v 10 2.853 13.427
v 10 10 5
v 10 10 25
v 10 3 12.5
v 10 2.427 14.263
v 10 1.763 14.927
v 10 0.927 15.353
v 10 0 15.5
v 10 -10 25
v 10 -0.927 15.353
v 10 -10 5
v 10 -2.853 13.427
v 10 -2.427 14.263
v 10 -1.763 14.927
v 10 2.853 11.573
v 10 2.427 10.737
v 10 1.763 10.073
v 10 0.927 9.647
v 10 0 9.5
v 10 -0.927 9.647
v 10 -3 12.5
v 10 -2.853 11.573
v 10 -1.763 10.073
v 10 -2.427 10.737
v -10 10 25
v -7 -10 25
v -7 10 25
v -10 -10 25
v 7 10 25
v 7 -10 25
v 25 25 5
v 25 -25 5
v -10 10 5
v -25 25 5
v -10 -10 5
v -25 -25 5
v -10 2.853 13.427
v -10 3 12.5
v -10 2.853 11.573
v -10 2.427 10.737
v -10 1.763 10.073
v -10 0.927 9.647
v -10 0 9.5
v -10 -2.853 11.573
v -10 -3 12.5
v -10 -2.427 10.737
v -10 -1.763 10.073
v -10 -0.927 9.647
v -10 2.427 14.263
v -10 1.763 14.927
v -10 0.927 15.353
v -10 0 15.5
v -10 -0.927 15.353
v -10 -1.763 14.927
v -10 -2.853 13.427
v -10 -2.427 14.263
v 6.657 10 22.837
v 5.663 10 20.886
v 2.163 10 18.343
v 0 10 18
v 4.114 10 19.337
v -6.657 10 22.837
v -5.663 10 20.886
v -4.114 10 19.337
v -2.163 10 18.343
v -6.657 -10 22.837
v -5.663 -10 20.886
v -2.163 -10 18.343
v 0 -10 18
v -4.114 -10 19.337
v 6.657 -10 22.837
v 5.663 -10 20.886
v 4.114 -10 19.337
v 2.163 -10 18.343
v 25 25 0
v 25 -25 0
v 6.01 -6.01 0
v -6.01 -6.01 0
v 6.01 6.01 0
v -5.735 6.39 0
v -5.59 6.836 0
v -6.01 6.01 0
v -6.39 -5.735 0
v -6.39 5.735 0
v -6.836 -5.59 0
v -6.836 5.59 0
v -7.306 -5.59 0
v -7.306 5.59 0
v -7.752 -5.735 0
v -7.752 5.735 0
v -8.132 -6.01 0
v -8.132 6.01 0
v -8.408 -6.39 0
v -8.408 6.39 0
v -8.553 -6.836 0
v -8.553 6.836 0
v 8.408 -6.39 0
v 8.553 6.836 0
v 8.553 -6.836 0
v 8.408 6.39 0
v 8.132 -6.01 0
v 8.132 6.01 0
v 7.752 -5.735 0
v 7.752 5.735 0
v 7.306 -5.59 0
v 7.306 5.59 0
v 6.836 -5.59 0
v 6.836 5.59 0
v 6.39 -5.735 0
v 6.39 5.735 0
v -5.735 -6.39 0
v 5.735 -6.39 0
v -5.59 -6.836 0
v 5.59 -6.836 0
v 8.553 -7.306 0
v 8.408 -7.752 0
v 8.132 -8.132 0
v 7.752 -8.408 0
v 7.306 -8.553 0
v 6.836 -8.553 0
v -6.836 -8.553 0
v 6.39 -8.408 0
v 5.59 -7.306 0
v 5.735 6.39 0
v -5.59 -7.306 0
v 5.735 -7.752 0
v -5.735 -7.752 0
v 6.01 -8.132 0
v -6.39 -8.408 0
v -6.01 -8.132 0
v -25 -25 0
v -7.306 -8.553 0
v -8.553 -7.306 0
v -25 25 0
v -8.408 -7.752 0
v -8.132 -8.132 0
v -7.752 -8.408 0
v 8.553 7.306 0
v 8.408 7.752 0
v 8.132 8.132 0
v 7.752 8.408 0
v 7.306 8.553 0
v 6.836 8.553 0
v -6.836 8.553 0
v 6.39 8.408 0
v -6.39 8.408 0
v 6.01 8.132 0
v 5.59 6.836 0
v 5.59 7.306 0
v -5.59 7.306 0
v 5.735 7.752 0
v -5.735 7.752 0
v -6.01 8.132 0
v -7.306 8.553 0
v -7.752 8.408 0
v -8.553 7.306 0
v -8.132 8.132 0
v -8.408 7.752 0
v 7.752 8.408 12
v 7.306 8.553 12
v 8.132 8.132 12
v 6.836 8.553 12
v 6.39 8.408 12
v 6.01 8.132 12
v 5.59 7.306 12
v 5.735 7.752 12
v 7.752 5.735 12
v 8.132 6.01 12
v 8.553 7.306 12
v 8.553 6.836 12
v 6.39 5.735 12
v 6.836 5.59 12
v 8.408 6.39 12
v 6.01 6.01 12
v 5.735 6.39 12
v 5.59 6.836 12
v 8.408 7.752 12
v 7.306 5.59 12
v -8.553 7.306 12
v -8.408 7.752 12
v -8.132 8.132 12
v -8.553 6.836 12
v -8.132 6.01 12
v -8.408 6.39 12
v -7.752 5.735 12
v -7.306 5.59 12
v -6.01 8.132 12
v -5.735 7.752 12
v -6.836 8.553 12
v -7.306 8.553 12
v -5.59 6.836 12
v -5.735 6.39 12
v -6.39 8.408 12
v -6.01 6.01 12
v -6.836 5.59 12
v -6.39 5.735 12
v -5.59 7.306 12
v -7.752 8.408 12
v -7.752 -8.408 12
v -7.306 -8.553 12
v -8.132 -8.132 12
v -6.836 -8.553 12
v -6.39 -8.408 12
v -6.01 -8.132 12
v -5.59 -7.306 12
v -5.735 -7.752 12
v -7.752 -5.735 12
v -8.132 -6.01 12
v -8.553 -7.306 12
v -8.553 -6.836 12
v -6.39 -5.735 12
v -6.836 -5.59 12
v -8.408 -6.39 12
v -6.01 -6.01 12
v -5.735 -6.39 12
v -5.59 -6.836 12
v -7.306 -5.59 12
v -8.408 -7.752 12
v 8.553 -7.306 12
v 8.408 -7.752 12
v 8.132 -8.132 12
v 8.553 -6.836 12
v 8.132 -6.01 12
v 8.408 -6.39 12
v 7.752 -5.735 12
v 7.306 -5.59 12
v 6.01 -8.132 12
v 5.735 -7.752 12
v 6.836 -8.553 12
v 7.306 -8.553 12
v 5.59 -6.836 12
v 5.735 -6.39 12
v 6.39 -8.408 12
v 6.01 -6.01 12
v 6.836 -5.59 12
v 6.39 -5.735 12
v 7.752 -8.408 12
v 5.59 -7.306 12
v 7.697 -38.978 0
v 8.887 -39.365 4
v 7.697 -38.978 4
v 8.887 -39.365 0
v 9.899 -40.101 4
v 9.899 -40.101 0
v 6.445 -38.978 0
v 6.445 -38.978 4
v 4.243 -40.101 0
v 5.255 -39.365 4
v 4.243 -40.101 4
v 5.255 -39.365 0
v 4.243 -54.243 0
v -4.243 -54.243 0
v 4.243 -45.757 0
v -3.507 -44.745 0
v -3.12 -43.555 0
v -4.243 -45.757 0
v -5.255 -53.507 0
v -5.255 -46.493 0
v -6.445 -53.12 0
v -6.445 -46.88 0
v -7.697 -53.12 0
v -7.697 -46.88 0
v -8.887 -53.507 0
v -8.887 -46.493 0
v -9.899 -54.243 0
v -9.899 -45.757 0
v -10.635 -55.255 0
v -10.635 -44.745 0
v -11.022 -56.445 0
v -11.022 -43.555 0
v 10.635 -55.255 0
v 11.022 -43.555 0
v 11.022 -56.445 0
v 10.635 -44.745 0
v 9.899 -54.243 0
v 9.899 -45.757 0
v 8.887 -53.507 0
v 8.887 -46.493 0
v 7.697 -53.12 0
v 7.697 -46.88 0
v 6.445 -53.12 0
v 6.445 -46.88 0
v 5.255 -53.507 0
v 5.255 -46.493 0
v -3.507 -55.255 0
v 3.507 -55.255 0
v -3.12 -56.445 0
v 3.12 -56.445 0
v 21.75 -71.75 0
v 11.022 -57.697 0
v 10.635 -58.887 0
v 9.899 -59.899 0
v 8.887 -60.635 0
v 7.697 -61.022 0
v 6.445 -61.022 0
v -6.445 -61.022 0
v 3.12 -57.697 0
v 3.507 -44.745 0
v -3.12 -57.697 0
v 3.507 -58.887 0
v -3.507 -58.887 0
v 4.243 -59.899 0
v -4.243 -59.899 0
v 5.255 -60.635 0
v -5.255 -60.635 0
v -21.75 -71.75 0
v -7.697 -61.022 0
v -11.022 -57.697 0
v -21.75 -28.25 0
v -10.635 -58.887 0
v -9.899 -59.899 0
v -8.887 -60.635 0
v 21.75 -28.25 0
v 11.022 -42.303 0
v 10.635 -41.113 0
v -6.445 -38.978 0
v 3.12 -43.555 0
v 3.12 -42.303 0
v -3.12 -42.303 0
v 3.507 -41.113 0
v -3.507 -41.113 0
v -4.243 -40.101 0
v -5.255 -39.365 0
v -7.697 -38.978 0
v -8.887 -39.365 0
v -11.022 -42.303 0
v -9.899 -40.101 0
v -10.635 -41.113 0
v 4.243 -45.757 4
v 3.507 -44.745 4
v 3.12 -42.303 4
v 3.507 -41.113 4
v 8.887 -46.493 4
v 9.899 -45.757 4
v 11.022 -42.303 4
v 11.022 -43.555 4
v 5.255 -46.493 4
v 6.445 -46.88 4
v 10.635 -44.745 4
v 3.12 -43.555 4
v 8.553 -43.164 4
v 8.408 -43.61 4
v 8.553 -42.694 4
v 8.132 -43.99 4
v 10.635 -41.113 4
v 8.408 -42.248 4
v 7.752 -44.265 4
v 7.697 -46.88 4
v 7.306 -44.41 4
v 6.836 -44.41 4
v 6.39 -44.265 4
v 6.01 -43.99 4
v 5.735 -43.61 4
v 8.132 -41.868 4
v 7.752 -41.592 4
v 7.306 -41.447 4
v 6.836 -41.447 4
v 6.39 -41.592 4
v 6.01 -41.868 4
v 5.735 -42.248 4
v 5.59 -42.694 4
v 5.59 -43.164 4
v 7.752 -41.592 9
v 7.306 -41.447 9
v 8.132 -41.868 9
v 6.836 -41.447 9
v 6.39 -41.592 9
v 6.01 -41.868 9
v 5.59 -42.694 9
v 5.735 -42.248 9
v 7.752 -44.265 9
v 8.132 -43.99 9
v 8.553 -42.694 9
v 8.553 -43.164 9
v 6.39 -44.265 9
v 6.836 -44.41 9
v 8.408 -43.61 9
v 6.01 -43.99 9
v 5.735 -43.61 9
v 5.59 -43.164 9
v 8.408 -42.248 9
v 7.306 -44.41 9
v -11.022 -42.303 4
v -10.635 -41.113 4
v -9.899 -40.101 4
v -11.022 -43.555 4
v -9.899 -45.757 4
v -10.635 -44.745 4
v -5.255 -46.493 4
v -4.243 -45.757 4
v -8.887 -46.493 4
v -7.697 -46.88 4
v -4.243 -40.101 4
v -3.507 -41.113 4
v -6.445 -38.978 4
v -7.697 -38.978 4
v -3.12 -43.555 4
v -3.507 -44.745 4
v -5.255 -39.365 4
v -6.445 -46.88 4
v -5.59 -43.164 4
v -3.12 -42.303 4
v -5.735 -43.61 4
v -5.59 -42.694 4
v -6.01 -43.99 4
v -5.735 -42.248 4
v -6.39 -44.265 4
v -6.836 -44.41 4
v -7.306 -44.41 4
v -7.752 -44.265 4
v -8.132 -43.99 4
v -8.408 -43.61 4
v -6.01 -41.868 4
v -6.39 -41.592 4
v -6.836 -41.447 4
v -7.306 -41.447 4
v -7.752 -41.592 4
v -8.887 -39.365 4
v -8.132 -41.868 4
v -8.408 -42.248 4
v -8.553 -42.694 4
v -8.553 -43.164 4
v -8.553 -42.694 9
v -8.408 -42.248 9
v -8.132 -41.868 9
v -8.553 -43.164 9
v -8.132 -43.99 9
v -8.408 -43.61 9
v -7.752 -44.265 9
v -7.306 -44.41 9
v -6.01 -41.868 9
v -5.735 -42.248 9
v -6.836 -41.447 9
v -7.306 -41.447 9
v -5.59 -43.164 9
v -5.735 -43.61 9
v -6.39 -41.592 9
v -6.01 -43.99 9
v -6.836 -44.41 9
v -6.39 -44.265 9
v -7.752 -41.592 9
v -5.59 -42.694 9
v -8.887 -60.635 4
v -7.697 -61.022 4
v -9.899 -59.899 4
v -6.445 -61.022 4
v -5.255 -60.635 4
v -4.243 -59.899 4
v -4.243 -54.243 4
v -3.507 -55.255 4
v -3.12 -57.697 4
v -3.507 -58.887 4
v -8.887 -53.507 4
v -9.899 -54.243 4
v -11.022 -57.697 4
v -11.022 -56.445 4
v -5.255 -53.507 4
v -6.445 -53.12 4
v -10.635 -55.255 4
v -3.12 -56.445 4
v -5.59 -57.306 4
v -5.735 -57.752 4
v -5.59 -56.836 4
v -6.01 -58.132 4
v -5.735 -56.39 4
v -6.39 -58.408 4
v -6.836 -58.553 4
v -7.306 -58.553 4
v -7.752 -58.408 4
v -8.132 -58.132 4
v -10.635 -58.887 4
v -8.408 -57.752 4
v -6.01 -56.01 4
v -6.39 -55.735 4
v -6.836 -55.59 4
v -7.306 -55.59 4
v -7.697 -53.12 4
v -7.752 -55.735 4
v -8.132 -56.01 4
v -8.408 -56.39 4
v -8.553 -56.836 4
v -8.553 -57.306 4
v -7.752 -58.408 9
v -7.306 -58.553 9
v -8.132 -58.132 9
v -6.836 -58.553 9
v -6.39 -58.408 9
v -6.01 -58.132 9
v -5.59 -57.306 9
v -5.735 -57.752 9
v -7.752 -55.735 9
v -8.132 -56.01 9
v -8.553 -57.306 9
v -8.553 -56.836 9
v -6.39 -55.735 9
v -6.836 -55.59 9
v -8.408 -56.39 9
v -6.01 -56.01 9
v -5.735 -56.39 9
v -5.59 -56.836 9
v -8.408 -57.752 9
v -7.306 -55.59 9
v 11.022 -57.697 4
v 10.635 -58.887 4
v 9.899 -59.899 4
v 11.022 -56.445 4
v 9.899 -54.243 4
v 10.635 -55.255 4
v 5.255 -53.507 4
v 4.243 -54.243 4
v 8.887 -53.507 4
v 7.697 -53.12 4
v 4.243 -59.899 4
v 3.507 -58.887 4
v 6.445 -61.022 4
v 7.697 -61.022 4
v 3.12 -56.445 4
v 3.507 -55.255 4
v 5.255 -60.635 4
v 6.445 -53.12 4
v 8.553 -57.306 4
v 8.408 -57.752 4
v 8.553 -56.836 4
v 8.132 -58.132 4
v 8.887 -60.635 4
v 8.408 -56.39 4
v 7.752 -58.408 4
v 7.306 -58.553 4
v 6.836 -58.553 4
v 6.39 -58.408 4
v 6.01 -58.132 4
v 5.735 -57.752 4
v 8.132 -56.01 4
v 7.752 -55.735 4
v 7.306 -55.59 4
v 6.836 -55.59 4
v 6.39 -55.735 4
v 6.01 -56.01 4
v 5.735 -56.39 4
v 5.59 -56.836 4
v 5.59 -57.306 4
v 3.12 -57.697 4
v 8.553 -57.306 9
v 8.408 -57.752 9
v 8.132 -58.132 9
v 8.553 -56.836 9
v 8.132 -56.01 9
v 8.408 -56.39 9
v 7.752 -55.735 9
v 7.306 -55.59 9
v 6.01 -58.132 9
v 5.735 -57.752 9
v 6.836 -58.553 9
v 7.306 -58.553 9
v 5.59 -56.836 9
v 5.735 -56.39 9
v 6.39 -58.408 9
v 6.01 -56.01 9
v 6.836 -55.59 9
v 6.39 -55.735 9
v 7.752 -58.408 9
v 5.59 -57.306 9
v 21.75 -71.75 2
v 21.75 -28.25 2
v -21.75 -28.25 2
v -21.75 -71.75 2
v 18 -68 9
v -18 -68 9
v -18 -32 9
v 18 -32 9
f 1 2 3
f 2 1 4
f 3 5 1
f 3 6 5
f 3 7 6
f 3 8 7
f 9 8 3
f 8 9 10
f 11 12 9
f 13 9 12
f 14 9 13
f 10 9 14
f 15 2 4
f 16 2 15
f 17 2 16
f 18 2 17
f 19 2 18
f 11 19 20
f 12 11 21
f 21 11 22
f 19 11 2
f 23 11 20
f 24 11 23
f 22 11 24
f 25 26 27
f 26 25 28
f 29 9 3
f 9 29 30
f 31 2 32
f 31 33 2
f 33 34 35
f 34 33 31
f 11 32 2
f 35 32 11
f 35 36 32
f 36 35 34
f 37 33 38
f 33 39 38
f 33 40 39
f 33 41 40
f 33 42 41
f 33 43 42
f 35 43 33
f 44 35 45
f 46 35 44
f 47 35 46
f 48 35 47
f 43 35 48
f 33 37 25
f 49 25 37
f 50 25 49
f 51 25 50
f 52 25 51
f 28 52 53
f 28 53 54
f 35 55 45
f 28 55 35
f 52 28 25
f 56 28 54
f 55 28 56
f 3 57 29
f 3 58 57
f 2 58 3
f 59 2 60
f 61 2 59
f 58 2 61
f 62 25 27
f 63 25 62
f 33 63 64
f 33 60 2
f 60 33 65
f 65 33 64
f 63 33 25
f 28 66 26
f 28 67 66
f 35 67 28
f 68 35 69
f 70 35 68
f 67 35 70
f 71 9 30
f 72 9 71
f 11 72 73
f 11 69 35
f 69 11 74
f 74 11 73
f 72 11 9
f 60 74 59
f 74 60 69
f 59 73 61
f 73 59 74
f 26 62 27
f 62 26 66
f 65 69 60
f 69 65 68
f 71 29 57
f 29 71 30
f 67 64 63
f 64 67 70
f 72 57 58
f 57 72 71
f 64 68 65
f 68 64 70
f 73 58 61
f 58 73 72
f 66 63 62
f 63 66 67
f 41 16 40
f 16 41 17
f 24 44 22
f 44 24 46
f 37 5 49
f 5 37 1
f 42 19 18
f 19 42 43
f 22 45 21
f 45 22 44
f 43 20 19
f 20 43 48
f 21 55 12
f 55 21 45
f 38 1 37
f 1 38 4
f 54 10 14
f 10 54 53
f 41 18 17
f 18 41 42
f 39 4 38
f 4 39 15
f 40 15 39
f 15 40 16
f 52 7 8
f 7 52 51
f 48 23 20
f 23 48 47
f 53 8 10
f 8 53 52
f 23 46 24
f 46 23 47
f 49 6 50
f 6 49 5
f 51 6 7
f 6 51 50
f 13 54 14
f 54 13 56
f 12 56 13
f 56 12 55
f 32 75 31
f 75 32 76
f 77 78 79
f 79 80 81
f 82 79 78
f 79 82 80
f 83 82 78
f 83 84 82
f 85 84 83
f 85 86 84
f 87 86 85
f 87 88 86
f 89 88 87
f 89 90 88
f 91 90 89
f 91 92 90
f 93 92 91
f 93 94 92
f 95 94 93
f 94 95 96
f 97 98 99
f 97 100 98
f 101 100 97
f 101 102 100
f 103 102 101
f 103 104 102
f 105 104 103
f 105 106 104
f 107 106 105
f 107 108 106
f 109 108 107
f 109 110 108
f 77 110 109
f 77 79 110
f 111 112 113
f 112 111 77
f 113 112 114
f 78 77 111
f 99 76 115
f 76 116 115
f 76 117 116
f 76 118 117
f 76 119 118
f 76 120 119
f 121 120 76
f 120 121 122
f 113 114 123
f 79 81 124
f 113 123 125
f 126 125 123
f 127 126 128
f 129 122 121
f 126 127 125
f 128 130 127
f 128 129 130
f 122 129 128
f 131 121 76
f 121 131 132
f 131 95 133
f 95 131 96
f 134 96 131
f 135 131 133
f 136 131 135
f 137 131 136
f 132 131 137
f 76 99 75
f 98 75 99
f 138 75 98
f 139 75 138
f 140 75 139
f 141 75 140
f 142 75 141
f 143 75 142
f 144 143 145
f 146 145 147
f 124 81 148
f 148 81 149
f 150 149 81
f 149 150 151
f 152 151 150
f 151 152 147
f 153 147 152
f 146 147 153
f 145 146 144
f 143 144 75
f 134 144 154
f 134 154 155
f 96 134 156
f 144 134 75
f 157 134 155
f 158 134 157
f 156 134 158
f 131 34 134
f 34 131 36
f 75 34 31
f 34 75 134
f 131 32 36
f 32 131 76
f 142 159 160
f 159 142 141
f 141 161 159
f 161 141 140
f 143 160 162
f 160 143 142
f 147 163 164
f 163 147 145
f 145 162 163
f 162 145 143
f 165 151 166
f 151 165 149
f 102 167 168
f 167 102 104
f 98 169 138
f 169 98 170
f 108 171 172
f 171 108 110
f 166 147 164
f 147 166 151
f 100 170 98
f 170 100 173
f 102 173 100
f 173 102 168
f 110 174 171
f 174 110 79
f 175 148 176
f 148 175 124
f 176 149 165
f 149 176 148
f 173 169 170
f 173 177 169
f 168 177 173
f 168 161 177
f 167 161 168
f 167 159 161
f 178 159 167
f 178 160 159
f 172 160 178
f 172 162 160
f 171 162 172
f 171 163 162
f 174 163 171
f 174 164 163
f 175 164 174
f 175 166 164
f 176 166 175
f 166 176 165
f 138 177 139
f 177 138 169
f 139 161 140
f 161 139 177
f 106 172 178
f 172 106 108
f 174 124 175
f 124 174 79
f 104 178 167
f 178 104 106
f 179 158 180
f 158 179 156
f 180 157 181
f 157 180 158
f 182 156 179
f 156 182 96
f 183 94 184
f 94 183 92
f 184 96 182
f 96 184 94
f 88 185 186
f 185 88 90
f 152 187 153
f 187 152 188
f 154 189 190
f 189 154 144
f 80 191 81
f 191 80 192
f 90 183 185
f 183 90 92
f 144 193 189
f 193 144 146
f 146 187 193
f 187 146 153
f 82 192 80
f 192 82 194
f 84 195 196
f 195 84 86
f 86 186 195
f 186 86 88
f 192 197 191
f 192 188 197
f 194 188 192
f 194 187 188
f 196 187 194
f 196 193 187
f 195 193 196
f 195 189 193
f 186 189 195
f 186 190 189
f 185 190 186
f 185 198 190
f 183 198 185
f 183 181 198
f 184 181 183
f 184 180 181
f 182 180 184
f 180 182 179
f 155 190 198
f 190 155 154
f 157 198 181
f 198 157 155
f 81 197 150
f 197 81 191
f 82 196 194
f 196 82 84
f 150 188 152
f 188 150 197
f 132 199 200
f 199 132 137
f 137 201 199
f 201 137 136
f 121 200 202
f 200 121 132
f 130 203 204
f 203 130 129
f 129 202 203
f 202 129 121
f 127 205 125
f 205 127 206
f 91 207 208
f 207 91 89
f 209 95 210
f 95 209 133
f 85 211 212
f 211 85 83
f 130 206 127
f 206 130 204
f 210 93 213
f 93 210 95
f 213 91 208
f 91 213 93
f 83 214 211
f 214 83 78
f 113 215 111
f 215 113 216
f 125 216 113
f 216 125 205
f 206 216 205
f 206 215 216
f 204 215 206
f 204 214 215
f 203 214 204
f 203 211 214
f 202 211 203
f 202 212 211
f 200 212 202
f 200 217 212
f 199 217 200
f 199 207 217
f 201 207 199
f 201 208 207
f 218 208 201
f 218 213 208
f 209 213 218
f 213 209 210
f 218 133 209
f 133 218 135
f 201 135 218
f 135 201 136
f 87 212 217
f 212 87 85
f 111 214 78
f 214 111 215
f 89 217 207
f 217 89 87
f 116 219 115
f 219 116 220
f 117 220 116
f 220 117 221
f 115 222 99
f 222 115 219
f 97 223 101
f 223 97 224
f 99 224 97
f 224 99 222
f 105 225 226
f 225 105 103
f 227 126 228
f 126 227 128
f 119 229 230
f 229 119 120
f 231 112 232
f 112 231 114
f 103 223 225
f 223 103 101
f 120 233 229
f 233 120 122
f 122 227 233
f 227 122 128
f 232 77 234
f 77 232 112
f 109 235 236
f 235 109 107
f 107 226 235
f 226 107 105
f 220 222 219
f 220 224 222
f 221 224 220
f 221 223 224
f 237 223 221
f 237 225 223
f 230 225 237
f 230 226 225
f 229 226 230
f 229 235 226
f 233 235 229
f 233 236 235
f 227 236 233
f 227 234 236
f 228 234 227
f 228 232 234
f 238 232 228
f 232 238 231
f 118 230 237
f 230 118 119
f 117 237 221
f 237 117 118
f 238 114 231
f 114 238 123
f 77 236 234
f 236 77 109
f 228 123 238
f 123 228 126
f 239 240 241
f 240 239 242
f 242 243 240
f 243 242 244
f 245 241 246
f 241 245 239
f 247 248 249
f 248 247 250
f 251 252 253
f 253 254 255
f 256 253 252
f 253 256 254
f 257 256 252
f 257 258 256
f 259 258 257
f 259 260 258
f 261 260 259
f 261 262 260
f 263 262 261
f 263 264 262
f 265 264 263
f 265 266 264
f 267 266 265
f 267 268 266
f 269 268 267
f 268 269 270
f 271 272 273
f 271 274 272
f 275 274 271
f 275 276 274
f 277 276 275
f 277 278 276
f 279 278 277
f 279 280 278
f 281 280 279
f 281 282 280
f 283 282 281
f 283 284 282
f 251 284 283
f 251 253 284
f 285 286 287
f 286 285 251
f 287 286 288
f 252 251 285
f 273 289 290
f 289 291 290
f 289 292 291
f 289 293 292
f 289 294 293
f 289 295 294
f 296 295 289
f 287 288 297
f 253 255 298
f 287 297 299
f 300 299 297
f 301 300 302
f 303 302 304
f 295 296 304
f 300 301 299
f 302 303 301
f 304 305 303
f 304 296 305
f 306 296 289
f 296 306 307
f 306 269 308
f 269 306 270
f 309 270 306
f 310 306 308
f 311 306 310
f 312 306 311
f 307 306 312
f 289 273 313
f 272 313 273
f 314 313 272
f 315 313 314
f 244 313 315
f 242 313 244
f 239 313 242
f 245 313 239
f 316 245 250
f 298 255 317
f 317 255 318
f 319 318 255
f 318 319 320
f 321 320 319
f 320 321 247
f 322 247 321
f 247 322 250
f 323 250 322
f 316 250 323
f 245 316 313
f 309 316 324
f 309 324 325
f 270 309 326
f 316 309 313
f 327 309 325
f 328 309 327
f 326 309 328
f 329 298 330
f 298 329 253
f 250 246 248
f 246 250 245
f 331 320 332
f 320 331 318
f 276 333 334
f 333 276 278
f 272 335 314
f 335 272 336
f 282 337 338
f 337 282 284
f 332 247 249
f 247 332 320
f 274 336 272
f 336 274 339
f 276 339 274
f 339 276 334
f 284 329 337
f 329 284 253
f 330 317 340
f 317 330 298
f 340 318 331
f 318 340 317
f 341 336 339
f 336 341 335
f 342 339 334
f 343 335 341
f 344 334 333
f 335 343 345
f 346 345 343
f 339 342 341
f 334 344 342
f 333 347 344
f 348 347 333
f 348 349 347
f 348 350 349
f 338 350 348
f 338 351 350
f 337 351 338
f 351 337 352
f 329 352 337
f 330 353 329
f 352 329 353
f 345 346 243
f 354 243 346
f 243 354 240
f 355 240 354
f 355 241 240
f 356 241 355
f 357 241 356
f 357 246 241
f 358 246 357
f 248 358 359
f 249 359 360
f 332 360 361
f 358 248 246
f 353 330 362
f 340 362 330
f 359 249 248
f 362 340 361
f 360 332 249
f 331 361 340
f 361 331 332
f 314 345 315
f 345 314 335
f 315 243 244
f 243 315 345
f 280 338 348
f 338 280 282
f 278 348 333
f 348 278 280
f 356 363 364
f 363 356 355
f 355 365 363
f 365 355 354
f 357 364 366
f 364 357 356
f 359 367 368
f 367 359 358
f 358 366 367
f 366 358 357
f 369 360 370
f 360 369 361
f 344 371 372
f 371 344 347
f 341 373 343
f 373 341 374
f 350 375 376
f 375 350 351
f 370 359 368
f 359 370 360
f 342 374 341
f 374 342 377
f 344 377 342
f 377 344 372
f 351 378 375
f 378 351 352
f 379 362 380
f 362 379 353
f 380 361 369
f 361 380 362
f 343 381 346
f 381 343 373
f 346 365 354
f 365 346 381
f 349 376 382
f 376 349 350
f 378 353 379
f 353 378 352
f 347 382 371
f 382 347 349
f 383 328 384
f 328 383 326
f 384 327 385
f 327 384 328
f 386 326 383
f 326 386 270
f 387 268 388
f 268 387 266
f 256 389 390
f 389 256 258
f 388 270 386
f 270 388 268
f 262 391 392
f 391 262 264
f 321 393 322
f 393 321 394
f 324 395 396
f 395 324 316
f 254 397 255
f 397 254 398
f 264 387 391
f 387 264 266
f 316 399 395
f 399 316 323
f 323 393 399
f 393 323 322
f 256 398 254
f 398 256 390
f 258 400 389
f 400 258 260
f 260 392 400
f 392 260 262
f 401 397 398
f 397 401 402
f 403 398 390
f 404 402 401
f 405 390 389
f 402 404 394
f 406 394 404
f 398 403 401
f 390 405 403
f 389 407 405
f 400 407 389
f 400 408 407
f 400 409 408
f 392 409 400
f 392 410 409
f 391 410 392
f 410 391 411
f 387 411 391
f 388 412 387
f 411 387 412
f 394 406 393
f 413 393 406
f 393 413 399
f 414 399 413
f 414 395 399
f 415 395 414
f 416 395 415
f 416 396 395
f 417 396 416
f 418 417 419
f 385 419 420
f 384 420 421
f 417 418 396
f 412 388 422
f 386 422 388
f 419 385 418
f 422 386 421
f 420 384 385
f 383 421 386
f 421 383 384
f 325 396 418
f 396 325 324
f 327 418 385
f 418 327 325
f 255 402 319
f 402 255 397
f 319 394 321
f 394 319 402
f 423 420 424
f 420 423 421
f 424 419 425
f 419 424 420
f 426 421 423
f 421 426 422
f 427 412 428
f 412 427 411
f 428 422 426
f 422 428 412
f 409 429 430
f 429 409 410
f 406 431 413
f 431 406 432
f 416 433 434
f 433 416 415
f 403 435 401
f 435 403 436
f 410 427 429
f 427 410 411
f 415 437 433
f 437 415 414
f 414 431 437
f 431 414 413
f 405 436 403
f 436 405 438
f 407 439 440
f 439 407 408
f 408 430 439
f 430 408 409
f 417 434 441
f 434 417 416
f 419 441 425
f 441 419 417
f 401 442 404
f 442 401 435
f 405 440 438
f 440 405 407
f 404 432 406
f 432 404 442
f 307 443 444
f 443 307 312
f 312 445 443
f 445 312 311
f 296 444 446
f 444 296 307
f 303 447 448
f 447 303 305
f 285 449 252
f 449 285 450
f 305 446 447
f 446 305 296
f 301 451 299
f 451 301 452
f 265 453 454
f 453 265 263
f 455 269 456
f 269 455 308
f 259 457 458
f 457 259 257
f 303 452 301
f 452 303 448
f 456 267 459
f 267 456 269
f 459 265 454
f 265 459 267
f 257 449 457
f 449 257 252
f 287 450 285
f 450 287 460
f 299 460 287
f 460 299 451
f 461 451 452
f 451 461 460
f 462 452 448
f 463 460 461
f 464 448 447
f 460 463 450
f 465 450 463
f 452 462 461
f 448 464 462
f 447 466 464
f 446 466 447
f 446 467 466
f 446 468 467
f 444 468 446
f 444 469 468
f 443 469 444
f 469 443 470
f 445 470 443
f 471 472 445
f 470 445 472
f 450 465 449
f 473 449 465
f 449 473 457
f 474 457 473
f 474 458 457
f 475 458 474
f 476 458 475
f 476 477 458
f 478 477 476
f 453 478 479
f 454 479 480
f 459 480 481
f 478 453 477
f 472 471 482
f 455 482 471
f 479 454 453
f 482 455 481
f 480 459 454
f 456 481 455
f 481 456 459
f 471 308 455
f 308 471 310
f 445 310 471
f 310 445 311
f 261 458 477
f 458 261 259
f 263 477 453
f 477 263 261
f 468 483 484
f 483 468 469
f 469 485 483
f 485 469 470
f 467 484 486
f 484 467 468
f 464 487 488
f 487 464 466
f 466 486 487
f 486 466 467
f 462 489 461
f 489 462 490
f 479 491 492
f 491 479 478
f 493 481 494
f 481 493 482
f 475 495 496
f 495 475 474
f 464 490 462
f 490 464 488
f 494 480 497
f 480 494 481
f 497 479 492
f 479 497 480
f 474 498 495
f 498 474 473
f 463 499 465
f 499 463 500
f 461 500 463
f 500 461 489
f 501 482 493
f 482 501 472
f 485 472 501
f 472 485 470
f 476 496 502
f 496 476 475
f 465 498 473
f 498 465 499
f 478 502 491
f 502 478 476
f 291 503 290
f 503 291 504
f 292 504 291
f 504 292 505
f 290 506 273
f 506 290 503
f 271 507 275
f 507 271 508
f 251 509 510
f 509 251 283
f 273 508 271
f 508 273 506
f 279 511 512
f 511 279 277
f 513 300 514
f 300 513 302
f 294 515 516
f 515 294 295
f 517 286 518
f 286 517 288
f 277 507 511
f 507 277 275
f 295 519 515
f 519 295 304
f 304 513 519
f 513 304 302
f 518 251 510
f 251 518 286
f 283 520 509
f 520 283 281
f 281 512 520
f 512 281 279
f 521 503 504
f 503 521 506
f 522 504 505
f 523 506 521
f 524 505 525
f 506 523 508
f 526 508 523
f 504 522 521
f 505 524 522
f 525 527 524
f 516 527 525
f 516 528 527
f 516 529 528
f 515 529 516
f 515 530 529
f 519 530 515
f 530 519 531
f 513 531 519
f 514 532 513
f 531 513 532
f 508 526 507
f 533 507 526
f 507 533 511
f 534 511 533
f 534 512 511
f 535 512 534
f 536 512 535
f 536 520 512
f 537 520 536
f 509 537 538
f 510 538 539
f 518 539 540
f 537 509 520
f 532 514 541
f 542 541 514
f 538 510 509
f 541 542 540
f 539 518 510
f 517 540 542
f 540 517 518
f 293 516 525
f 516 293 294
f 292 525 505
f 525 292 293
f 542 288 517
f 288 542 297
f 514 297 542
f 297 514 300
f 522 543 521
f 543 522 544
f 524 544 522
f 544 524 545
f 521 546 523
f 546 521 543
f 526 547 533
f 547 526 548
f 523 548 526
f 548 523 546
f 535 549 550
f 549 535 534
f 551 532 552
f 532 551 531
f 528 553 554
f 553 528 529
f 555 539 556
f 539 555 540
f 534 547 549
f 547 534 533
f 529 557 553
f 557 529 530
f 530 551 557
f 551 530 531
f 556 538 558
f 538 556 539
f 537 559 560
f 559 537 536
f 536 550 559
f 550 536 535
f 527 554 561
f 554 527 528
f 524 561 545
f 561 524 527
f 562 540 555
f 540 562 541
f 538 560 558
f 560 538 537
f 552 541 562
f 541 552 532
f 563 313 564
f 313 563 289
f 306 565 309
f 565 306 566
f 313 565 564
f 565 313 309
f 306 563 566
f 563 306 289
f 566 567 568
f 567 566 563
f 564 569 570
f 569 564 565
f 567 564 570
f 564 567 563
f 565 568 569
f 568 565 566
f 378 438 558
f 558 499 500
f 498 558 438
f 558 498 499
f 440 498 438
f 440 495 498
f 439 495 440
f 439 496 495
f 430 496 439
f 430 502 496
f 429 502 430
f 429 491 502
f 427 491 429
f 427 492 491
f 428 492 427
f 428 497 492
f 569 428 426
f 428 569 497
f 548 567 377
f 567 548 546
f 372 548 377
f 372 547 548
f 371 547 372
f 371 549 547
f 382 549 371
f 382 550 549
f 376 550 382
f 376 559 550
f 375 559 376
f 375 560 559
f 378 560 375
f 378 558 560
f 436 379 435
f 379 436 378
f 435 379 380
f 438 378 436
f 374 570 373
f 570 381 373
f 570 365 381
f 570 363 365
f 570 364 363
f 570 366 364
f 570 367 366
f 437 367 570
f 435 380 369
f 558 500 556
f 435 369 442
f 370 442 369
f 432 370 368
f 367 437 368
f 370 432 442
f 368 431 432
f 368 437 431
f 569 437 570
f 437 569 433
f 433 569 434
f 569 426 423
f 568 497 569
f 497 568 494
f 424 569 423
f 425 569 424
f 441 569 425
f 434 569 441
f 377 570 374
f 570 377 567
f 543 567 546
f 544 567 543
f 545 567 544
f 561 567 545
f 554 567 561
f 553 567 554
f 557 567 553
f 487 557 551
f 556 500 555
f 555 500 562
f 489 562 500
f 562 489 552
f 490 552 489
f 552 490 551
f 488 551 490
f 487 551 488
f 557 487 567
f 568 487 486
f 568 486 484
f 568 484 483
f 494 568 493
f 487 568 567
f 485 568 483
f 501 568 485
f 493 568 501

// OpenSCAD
// Designed for use with Hama "Star 61" Tripod

// Tripod mount is designed for mounting custom objects on a standard photographic tripod with removable base plate. It is designed to be 3D printed and assembled from two pieces. The top can be modified to fit any object.

// To assemble, use M3x20mm screws, they tap into the plastic of the palte directly.


//Dimensions of the attachment base defined here
base_lower_wl=43.5; // lower width
base_upper_wl=36; // upper width
base_h=9; // height of the base
base_h_flat=2; // height of the flat side

base_screw_head_dia=8; // diameter of the mounting screw
base_screw_head_h=4; // depth of screw head countersunk
base_screw_dia=3; // diameter of the screw
screw_l=25; // length of the screw
screw_dist=20; // distance between screws

// Dimensions of the upper part - plate
plate_wl=50; // size of the plate
plate_h=5; // thickness of the plate
// Attached to the plate is the mounting 

// Payload mount definition, custom for every use-case, note that holes for screws may be cut into the mount, depending on the screw length defined.
payload_cube_wl=20;

module payload_mount(){
			translate([-payload_cube_wl/2,-payload_cube_wl/2,0])
			difference(){
				cube(size = [payload_cube_wl,payload_cube_wl,payload_cube_wl], center=false);
				//groove for the laser
				translate([payload_cube_wl/2,payload_cube_wl/2,payload_cube_wl])
				rotate([90,0,0])
				cylinder(h=payload_cube_wl+0.1,r=14/2,center=true,$fn=20);
				//zip tie hole
				translate([payload_cube_wl/2,payload_cube_wl/2,7.5])
				rotate([0,90,0])
				cylinder(h=payload_cube_wl+0.1,r=6/2,center=true,$fn=20);
	
			}
}

// Function for creating a pyramid
module pyramid(w, l, h) {
	mw = w/2;
	ml = l/2;
	polyhedron(points = [
			[0, 0, 0],
			[w, 0, 0],
			[0, l, 0],
			[w, l, 0],
			[mw, ml, h]
		], triangles = [
			[4, 1, 0],
			[4, 3, 1],
			[4, 2, 3],
			[4, 0, 2],
			//base
			[0, 1, 2],
			[2, 1, 3]
		]);
}

// Creating a base for the tripod mount
module base(){
	translate([-base_lower_wl/2,-base_lower_wl/2,0])
	intersection(){
		union(){
			cube(size = [base_lower_wl,base_lower_wl,base_h_flat], center = false);
			translate([0,0,base_h_flat])
			pyramid(base_lower_wl,base_lower_wl,(base_lower_wl*(base_h-base_h_flat))/(base_lower_wl-base_upper_wl));
		}
		cube(size = [base_lower_wl,base_lower_wl,base_h], center = false);
	}
}

// A model of the screw
module sunk_screw(){
	translate([0,0,base_screw_head_h/2])
	cylinder(h=base_screw_head_h,r=base_screw_head_dia/2,center=true,$fn=20);
	translate([0,0,screw_l/2])
	cylinder(h=screw_l,r=base_screw_dia/2,center=true,$fn=20);
}

// Cutting the holes for the screws in the base
module base_with_screws(){
	translate([0,0,-base_h])
	difference(){
		base();
		for (i = [0,90,180,270]){
			rotate([0,0,i+45])
			translate([screw_dist/2,0,0])
			sunk_screw();
		}
	}
}

// Creating the plate and cutting the holes for screws
module plate(){
	difference(){
		union(){
			translate([-plate_wl/2,-plate_wl/2,0])
			cube(size = [plate_wl,plate_wl,plate_h], center=false);
			translate([0,0,plate_h])
			payload_mount();
		}
		translate([0,0,-base_screw_head_h-base_h])
		for (i = [0,90,180,270]){
			rotate([0,0,i+45])
			translate([screw_dist/2,0,0])
			sunk_screw();
		}
	}
}

// Finally building parts, translate function there to shift the objects for export

plate();
translate([0,-50,base_h])
base_with_screws();

		
